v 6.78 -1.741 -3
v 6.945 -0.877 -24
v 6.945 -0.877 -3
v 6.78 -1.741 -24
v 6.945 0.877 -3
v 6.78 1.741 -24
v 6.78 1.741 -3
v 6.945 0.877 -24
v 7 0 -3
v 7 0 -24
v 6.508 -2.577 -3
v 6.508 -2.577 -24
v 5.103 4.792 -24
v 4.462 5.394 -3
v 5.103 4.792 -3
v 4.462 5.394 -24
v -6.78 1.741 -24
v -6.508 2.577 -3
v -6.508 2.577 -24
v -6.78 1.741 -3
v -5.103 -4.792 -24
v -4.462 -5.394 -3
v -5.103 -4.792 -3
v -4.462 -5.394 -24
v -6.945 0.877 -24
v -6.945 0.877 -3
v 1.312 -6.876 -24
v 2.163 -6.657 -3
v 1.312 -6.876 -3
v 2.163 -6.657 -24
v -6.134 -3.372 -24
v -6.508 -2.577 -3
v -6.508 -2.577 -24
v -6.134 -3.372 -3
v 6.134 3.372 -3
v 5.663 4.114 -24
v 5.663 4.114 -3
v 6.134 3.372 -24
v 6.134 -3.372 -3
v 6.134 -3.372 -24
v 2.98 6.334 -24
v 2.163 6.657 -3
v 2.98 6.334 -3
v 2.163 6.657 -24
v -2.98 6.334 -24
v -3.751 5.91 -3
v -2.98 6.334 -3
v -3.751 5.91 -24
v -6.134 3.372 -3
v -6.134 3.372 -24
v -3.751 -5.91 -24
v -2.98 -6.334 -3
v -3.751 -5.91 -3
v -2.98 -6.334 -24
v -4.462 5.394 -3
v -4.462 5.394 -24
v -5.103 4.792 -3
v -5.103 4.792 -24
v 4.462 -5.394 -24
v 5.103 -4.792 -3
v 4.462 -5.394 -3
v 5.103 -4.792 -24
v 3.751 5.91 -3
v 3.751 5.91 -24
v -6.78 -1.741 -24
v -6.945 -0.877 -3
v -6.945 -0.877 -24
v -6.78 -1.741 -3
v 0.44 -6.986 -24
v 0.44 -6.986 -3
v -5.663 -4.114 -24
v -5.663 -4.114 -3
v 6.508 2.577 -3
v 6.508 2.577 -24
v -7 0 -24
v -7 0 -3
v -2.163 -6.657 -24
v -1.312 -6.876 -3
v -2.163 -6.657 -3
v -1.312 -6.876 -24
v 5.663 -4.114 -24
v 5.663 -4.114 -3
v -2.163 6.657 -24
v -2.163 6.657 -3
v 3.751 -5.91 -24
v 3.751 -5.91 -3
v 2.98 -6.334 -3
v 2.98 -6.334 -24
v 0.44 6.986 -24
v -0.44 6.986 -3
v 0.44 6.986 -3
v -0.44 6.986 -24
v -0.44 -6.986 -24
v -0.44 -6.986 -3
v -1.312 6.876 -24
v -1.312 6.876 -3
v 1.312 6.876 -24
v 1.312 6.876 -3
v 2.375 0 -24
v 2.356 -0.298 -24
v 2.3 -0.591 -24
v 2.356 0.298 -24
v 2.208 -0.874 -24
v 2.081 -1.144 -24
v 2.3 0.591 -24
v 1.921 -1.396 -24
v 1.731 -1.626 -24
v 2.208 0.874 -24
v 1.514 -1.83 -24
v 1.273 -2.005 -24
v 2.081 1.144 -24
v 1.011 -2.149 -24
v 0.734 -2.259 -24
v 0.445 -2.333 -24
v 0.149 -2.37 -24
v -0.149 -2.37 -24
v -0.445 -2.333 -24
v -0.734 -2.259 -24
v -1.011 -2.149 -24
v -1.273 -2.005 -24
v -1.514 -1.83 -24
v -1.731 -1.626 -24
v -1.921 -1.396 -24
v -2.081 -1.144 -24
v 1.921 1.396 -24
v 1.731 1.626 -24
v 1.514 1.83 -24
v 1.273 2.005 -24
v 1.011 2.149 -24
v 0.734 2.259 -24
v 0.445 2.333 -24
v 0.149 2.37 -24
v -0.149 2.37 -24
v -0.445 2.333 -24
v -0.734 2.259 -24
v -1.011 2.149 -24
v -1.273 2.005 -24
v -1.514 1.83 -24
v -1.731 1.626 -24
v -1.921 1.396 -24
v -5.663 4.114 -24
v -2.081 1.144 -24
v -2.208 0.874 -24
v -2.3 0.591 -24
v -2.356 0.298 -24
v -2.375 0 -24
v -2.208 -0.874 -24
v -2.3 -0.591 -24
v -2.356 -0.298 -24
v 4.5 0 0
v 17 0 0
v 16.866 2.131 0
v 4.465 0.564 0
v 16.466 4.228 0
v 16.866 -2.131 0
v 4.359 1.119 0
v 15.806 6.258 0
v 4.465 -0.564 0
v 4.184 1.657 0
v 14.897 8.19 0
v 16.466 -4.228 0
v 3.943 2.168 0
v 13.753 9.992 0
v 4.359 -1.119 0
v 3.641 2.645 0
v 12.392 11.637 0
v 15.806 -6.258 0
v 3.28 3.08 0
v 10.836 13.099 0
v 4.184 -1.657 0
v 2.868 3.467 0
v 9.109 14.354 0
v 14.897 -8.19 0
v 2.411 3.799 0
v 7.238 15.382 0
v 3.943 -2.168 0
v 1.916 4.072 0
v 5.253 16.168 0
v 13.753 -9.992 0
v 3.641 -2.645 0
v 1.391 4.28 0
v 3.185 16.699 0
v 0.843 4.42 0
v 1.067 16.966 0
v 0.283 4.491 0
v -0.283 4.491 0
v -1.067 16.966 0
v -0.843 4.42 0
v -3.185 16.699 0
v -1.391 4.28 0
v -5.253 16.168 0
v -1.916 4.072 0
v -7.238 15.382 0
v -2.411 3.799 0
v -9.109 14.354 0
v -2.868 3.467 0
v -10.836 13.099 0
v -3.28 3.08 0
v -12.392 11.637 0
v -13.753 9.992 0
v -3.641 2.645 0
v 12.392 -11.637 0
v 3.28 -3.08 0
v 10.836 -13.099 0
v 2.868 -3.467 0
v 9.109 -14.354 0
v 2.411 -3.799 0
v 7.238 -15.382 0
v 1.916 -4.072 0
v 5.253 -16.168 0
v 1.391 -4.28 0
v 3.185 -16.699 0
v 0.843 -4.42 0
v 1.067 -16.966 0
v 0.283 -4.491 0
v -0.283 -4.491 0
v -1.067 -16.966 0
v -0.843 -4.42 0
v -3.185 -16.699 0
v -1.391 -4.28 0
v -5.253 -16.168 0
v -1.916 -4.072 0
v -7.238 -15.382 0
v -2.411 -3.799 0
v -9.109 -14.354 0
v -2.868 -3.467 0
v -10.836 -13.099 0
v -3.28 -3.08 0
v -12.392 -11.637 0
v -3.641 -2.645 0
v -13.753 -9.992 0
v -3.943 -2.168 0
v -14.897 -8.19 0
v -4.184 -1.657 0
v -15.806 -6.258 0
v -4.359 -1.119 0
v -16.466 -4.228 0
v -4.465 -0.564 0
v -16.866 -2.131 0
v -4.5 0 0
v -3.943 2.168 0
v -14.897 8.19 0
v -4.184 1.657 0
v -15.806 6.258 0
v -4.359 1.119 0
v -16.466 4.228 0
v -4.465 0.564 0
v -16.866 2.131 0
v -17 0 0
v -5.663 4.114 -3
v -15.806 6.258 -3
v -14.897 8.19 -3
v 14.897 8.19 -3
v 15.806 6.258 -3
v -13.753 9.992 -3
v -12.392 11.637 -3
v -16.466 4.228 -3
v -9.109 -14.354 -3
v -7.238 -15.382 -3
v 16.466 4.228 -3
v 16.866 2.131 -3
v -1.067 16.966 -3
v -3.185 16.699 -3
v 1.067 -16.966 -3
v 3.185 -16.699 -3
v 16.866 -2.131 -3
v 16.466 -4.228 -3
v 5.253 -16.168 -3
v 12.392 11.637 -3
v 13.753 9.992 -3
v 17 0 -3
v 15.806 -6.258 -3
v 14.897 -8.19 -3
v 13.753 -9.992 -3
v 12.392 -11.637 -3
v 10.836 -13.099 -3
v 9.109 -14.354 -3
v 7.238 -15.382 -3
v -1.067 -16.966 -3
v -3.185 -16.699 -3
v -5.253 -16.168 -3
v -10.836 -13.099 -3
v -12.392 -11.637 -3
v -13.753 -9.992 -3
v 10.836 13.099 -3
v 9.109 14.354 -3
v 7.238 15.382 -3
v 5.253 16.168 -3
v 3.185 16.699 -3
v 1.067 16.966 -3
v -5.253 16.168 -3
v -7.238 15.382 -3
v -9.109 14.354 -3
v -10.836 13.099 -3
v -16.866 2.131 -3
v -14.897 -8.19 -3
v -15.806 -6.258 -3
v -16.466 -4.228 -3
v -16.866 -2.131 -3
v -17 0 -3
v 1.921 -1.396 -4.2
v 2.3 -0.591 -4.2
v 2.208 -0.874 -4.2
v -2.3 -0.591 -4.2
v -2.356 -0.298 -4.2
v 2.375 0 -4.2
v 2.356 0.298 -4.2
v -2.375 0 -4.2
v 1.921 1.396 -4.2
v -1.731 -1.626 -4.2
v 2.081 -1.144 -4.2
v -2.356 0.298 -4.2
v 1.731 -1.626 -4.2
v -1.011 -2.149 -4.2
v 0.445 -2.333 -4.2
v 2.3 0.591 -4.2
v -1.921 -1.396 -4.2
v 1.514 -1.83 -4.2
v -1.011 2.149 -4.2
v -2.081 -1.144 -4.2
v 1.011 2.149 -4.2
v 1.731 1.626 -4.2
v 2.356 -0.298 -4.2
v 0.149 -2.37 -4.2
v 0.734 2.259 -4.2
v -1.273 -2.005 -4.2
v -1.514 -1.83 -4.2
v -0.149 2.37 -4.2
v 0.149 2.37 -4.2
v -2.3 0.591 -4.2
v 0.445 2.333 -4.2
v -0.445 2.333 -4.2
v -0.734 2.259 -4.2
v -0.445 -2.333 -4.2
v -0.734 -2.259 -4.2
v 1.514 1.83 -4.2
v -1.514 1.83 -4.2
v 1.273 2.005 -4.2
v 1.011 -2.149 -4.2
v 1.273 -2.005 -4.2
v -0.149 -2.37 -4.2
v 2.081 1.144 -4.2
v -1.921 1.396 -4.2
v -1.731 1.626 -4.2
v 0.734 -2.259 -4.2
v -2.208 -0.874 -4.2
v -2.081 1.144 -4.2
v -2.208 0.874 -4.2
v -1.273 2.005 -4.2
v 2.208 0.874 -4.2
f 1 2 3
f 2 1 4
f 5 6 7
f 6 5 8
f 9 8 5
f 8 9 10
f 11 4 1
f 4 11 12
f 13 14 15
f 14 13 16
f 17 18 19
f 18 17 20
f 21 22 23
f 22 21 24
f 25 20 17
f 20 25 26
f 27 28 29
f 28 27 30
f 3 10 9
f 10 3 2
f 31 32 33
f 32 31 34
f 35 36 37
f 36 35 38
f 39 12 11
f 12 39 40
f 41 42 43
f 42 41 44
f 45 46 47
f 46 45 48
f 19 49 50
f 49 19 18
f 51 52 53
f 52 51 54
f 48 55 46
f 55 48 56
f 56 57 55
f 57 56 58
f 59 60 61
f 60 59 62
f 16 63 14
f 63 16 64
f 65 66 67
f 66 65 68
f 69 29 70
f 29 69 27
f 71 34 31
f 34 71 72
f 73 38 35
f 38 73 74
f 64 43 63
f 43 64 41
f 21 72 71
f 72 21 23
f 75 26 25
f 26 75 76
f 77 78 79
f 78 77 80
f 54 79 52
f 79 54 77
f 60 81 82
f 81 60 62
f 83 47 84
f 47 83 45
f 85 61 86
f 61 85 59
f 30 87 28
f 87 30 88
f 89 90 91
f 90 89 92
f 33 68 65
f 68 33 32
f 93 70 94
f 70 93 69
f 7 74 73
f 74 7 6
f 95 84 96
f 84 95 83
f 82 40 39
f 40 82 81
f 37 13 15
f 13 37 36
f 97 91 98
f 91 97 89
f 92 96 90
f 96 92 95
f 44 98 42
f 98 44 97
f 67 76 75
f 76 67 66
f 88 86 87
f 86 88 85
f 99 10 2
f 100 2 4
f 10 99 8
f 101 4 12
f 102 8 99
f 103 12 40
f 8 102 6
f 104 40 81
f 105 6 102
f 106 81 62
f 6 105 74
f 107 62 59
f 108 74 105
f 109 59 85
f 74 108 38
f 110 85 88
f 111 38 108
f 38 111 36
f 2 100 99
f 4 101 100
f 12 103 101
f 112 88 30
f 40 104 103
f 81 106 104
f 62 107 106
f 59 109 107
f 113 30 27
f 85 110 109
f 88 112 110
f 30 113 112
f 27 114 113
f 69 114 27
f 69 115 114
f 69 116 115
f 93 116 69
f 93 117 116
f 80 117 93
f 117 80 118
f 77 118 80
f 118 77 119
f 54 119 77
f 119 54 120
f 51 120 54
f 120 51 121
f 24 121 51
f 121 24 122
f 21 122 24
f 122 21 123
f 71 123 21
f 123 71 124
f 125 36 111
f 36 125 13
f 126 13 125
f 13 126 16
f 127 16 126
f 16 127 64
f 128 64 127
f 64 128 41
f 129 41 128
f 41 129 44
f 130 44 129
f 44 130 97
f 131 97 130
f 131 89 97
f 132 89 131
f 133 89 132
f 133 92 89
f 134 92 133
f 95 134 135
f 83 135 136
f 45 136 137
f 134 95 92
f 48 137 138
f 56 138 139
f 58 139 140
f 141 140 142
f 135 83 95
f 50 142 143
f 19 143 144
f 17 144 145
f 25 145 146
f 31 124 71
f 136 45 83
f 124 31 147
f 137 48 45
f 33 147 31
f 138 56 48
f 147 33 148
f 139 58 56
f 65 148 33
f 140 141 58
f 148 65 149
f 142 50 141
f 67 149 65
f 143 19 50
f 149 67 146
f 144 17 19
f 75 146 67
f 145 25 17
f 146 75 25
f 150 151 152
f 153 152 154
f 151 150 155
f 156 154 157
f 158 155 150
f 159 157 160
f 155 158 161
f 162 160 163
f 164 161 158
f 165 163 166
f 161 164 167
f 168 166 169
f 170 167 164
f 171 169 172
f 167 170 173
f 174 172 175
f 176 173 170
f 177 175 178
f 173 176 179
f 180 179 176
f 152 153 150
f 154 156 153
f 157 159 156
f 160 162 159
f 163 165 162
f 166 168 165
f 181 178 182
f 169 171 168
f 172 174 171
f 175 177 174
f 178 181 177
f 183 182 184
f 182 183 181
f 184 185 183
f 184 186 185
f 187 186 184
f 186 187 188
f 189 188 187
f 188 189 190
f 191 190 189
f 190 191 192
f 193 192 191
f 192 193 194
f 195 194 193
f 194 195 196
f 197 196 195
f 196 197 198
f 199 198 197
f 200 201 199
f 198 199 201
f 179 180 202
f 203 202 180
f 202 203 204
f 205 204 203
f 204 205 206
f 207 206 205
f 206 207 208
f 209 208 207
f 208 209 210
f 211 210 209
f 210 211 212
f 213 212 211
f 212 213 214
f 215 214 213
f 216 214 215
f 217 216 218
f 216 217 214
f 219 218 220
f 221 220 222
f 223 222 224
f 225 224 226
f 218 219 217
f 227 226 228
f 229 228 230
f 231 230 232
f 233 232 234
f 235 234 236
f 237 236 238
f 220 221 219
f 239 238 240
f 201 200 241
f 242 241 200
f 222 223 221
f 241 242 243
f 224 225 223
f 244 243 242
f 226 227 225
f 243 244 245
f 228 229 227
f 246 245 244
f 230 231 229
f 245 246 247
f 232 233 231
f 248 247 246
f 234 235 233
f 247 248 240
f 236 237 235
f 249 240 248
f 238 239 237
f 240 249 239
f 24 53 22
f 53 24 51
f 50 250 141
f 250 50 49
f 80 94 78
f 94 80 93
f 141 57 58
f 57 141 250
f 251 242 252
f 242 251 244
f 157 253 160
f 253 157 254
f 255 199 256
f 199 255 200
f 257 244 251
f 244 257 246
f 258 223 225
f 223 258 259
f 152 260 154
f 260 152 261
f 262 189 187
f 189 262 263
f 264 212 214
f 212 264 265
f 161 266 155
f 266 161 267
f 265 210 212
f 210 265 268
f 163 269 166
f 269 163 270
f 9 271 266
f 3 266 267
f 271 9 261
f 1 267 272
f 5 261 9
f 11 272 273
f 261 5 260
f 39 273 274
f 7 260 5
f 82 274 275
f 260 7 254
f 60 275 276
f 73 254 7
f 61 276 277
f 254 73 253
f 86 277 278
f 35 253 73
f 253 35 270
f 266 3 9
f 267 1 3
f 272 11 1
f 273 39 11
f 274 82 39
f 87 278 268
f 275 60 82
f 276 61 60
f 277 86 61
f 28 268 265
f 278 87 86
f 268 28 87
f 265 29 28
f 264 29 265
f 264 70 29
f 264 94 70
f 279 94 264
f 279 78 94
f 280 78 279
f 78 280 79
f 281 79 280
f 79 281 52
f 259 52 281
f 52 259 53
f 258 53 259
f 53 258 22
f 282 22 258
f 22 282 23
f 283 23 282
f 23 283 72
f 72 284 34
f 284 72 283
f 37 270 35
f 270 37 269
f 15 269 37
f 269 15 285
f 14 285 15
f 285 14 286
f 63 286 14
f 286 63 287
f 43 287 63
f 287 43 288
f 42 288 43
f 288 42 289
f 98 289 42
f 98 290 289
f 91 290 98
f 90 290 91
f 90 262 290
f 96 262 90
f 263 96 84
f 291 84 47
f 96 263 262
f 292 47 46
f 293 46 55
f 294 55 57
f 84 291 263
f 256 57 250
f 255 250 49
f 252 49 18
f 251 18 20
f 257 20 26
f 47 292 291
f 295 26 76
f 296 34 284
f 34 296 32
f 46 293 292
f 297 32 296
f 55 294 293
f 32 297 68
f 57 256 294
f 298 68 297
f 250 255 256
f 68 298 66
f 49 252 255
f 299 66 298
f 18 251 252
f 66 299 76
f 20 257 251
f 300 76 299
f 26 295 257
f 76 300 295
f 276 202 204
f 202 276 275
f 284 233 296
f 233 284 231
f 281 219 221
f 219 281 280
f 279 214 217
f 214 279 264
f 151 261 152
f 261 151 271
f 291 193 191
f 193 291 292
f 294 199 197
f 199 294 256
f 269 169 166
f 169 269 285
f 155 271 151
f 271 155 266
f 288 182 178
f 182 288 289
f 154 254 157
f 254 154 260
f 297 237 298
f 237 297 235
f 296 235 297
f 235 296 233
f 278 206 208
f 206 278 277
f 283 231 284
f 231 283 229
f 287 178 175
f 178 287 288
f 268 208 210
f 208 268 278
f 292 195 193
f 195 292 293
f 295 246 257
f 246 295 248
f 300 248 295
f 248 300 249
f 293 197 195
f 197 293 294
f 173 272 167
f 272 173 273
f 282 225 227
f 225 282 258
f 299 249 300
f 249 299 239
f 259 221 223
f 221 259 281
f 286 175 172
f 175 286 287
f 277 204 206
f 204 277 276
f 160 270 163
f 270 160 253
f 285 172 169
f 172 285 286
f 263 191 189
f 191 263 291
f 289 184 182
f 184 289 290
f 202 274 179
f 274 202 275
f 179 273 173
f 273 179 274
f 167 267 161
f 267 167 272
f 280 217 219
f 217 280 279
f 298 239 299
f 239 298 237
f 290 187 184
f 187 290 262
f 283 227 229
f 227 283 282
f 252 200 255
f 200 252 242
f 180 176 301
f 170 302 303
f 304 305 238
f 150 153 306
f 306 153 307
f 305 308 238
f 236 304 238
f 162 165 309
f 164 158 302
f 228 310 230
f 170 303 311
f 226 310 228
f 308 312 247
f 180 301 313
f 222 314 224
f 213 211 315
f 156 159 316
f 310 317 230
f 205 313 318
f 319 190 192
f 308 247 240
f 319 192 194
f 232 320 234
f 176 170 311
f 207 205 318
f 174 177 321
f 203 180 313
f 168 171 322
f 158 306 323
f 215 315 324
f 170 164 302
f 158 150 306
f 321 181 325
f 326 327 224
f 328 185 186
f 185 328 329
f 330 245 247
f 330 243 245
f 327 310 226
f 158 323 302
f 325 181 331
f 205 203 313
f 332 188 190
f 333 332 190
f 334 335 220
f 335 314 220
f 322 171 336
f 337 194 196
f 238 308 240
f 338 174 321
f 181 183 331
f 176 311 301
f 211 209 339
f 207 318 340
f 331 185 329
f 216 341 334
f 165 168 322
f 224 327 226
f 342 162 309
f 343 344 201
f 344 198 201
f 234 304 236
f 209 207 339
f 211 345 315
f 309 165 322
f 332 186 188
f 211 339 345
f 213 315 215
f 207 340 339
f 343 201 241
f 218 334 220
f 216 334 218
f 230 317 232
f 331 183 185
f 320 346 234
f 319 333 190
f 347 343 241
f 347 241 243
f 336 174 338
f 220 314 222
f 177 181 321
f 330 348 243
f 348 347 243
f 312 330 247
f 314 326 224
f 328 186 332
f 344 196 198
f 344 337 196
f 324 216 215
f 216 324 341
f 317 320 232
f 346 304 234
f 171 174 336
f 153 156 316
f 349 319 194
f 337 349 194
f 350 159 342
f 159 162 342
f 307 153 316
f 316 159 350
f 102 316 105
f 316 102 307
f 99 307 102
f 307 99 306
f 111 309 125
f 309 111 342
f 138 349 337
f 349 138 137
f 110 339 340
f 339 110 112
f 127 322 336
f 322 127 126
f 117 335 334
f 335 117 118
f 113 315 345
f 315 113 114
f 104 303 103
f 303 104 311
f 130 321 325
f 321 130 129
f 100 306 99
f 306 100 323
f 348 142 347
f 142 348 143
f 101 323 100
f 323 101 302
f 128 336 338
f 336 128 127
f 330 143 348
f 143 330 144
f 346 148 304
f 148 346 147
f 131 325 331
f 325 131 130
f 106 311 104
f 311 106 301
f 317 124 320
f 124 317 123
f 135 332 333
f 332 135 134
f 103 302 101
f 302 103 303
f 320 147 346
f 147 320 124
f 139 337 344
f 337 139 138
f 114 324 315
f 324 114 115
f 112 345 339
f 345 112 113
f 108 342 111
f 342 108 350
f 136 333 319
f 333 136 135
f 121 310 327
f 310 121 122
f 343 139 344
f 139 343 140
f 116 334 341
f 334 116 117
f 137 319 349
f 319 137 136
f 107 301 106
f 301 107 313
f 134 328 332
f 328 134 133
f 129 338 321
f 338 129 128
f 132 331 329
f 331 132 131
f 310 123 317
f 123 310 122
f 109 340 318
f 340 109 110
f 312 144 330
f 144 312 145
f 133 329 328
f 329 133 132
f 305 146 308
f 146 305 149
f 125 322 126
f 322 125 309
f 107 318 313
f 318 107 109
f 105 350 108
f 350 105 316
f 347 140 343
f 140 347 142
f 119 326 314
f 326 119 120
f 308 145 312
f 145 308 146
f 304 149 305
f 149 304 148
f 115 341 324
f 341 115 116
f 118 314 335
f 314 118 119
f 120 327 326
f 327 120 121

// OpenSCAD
$fn = 50;


difference() {
	union() {
		translate(v = [0, 0, -24.0000000000]) {
			cylinder(h = 24, r = 7.0000000000);
		}
		translate(v = [0, 0, -3.0000000000]) {
			cylinder(h = 3, r = 17.0000000000);
		}
	}
	union() {
		translate(v = [0, 0, 0]) {
			rotate(a = [0, 0, 0]) {
				difference() {
					union() {
						#translate(v = [0, 0, -24.0000000000]) {
							cylinder(h = 24, r = 2.2500000000);
						}
						#translate(v = [0, 0, -4.2000000000]) {
							cylinder(h = 4.2000000000, r = 7.0000000000, r1 = 2.3750000000, r2 = 4.5000000000);
						}
						#translate(v = [0, 0, -24.0000000000]) {
							cylinder(h = 24, r = 2.3750000000);
						}
						#translate(v = [0, 0, -24.0000000000]) {
							cylinder(h = 24, r = 2.2500000000);
						}
					}
					union();
				}
			}
		}
	}
}
